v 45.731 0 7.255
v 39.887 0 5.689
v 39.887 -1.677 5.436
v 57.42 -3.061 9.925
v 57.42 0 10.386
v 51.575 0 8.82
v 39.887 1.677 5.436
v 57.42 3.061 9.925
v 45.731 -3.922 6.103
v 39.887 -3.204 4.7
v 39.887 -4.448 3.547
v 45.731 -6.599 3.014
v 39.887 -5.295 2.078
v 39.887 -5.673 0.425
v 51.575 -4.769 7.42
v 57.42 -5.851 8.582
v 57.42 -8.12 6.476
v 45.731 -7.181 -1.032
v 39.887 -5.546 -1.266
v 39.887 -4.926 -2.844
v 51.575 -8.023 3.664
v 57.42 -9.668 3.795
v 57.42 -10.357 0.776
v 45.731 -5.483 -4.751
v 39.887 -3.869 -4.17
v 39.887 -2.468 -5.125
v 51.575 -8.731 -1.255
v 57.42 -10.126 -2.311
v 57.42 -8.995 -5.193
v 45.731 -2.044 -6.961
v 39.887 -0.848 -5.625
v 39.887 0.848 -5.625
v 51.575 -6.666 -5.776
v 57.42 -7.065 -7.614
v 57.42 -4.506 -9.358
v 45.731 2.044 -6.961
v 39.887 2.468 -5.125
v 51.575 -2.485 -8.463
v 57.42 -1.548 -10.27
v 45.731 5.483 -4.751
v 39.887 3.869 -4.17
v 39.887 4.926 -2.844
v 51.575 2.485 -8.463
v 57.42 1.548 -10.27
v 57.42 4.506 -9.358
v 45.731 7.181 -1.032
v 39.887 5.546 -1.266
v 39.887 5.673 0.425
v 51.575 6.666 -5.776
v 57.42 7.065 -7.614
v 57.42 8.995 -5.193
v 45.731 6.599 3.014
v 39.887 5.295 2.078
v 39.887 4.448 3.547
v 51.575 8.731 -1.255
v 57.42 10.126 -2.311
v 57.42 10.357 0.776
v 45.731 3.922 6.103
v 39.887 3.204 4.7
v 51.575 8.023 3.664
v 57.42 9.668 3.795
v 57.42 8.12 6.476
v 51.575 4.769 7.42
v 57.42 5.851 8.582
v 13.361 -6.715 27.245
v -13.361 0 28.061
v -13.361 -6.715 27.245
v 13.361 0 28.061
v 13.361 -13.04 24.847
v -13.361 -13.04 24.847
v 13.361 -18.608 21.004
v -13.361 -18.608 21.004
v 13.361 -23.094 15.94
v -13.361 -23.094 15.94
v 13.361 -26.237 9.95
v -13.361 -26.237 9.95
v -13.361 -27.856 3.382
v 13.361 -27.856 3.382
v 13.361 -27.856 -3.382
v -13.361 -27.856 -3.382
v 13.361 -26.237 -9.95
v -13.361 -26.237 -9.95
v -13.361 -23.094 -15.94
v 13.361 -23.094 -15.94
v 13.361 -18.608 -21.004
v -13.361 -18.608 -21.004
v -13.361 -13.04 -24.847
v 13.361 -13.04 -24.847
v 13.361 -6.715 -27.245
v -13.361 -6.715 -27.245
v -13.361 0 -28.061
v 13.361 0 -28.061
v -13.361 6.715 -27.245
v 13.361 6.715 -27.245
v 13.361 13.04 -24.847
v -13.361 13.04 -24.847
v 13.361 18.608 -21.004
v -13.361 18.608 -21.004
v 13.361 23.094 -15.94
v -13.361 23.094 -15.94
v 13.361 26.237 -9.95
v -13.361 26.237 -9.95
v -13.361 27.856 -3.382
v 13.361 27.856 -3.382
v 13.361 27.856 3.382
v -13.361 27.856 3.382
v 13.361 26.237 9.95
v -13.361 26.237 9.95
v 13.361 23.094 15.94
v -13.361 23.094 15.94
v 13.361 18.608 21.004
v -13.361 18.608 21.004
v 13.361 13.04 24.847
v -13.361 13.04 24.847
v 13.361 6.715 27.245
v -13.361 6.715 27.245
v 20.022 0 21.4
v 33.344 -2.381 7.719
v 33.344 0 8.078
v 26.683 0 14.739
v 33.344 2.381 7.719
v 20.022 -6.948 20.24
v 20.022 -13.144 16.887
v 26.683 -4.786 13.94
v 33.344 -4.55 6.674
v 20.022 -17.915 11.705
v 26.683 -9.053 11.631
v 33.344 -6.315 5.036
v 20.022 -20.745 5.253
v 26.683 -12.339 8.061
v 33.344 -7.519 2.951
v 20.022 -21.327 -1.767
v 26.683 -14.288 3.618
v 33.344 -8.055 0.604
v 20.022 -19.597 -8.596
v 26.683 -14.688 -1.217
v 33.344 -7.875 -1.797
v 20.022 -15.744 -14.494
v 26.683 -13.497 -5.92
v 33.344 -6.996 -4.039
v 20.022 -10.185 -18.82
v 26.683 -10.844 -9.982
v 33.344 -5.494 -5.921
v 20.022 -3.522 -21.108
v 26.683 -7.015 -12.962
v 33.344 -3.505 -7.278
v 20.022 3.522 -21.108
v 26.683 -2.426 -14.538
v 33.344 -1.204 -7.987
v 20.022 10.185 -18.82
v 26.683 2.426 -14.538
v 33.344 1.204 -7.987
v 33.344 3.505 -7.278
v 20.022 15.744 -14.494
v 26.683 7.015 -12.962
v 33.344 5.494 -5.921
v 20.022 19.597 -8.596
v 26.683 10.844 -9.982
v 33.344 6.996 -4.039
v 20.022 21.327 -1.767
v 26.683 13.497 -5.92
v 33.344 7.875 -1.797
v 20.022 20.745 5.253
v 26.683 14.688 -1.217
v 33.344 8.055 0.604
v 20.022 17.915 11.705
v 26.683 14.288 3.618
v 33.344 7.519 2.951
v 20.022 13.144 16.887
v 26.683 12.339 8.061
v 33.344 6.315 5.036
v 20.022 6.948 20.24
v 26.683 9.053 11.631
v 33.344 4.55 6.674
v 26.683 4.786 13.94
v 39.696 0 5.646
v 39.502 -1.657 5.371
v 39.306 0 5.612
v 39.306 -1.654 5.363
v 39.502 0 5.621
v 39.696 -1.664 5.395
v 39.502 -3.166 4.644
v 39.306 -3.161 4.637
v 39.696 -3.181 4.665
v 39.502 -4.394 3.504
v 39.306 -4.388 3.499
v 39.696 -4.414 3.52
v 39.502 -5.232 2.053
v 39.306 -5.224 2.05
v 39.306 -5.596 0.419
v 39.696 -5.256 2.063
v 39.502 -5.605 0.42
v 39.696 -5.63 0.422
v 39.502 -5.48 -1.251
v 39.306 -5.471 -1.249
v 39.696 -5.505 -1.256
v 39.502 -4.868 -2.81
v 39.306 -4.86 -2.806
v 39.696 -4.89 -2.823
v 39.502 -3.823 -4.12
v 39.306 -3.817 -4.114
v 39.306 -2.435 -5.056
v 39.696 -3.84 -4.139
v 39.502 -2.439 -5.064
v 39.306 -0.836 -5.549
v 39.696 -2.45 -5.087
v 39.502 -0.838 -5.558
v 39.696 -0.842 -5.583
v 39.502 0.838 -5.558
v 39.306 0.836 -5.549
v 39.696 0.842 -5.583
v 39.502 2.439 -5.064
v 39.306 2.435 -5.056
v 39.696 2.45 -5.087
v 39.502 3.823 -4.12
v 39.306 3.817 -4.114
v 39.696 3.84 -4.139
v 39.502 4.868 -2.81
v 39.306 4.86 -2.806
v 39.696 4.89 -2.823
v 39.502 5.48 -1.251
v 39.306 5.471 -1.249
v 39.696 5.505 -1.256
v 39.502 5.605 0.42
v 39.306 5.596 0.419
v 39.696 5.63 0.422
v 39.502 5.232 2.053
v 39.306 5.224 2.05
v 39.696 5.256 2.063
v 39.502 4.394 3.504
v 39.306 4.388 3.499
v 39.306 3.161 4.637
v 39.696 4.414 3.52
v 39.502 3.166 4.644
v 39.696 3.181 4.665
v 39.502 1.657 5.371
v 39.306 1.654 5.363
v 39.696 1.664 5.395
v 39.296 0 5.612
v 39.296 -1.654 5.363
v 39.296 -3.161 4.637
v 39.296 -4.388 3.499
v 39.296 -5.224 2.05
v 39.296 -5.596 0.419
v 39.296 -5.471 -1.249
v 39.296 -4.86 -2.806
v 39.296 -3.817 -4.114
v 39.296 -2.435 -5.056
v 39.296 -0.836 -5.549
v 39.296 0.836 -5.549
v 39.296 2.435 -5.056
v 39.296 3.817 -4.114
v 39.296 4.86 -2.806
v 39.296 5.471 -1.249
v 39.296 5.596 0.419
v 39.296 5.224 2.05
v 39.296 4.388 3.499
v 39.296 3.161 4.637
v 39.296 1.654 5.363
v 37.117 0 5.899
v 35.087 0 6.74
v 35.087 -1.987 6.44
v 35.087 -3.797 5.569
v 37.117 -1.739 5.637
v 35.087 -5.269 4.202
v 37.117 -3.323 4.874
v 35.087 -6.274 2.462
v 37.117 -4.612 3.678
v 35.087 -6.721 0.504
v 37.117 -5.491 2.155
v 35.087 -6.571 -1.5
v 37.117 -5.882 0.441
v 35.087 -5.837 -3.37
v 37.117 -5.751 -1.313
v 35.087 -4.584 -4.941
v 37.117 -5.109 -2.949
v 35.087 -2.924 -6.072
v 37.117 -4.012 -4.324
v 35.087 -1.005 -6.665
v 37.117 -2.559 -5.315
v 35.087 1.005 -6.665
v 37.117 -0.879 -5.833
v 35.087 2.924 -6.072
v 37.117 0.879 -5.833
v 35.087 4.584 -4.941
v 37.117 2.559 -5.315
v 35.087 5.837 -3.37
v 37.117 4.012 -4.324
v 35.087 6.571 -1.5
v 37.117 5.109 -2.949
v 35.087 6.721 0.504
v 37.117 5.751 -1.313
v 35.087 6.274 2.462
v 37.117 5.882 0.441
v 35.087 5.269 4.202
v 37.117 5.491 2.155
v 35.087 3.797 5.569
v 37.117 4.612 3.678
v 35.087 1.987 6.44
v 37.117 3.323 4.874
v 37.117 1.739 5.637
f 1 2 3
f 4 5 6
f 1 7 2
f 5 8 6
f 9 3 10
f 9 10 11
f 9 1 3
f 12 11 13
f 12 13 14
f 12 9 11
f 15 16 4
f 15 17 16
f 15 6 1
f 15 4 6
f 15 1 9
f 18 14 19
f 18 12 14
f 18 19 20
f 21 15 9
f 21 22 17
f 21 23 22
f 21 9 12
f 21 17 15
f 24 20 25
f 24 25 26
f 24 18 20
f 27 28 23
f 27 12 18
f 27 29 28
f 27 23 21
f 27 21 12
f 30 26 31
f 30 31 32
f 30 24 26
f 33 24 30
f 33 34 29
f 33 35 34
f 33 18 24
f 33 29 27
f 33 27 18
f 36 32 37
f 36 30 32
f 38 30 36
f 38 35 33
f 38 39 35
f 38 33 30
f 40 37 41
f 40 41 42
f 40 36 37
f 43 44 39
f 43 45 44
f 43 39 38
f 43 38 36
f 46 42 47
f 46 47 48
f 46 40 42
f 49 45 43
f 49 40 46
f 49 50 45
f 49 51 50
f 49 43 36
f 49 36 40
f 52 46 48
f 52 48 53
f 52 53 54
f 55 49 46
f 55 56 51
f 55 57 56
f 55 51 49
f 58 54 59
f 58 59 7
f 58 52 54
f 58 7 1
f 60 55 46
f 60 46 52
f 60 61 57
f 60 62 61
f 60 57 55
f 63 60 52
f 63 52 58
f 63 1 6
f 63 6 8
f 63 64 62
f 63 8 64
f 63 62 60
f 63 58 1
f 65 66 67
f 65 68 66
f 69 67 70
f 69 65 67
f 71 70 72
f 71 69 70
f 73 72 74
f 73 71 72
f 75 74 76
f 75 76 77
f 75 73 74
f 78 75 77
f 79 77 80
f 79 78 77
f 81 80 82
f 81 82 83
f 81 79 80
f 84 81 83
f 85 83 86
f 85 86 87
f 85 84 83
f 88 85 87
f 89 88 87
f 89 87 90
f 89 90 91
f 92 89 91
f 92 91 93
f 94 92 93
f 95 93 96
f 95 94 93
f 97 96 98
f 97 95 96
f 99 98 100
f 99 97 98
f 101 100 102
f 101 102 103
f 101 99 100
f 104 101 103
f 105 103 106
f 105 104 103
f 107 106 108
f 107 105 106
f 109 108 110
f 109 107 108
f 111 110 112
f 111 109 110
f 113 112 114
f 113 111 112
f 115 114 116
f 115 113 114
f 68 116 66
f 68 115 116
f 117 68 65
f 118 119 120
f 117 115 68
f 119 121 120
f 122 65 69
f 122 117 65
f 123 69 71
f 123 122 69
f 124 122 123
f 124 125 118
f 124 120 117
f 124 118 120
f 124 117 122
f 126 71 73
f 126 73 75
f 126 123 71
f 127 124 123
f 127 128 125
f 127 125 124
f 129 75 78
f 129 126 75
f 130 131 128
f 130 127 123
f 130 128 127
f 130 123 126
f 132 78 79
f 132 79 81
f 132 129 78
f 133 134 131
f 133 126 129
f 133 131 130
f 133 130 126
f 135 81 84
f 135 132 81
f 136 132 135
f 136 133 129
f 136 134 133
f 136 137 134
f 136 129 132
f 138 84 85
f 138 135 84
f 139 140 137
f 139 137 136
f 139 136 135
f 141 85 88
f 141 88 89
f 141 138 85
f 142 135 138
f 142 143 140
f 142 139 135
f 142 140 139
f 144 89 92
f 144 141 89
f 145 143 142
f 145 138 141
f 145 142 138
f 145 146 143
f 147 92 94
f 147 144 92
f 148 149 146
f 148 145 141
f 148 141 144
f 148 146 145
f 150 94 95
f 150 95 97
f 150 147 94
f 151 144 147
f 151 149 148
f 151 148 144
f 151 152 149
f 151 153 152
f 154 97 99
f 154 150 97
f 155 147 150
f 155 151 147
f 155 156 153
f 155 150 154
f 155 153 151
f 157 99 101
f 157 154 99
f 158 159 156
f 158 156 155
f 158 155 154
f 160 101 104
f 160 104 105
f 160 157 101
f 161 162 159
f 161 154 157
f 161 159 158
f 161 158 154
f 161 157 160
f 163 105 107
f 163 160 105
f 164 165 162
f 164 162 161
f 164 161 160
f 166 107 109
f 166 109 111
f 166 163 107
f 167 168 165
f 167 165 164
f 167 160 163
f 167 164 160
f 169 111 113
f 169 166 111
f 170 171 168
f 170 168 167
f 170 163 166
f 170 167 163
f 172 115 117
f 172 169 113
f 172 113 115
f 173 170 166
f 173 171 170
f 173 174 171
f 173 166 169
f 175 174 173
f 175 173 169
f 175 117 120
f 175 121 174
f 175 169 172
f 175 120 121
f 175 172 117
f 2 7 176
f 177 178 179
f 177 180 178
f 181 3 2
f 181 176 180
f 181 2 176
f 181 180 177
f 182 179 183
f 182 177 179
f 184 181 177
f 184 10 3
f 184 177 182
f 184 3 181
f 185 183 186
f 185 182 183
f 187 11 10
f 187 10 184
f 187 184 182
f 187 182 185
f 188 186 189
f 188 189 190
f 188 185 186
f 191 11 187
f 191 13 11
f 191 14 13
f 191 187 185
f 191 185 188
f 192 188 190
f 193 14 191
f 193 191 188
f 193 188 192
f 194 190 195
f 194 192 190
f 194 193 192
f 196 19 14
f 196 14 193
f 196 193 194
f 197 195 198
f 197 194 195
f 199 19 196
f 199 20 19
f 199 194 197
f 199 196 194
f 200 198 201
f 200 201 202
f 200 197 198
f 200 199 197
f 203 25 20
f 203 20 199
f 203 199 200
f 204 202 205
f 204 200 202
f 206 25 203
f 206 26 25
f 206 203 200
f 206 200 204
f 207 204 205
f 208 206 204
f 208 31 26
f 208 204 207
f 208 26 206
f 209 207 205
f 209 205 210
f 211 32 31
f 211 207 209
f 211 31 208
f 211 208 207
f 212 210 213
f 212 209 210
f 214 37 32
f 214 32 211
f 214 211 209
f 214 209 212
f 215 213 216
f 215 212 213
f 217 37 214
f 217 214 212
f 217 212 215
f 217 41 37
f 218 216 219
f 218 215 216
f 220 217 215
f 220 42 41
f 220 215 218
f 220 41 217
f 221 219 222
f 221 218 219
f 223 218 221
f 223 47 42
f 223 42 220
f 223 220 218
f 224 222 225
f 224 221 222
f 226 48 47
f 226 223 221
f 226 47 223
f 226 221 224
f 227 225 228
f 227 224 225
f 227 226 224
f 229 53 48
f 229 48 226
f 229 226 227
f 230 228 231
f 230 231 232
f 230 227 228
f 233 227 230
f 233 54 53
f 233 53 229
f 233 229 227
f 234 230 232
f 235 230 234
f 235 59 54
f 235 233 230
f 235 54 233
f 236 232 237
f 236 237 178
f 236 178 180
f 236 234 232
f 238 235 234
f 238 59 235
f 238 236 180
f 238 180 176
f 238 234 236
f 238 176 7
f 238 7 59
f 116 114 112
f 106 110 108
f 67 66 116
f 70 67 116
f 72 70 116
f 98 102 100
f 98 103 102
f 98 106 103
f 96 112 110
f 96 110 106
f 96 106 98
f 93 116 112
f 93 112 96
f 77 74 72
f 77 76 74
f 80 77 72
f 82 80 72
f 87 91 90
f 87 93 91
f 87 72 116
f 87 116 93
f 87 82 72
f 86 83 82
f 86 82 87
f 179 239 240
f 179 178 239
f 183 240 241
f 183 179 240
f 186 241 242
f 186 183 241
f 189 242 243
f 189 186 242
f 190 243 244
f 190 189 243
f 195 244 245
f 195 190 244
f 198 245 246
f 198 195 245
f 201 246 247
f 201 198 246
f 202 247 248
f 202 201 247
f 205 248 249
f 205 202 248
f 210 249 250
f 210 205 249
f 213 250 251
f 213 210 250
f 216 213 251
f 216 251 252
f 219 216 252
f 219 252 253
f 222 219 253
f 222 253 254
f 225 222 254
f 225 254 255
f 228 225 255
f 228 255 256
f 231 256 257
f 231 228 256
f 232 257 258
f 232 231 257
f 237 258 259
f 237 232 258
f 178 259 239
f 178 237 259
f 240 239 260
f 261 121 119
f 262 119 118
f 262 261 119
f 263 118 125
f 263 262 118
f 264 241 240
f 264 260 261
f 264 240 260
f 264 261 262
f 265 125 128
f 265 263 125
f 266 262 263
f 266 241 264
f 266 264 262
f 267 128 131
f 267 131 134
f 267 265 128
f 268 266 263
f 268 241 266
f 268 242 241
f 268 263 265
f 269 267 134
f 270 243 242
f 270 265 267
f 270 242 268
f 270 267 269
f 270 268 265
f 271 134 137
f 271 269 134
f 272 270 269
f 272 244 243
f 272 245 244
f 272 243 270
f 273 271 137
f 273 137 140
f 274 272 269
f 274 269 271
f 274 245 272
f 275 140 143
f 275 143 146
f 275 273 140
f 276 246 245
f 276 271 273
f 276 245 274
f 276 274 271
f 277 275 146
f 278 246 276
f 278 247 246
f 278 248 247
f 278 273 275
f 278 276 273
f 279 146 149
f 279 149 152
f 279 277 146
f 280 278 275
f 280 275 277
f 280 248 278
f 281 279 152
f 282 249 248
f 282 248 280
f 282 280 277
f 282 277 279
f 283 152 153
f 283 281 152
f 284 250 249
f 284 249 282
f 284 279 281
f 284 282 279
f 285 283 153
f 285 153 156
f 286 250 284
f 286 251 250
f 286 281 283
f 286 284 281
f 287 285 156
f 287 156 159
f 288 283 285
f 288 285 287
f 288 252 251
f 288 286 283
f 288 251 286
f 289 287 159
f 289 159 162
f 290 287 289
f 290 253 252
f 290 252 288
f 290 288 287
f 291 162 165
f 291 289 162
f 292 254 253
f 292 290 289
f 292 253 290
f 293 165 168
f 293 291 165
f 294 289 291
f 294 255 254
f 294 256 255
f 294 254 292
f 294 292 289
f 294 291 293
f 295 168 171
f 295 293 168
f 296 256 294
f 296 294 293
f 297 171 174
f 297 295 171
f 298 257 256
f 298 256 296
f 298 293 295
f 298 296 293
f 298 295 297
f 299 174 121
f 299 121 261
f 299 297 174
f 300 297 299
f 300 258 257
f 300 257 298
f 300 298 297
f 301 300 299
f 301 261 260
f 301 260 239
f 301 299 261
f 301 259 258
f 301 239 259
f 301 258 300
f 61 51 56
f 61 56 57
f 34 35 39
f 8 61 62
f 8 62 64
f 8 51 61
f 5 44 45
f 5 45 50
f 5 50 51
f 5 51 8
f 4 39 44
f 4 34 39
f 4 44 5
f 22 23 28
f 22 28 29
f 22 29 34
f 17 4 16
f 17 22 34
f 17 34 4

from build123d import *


with BuildPart() as part:
    # Sketch1 → Revolve1 (revolve)
    with BuildSketch(Plane.XY, mode=Mode.PRIVATE) as revolve1_sk:
        with BuildLine():
            Line((-13.36065, 28.0607), (13.36065, 28.0607))
            Line((13.36065, 28.0607), (33.34363095, 8.07771905))
            ThreePointArc((33.34363095, 8.07771905), (36.074675364, 6.252893513), (39.2961619, 5.6121))
            Line((39.2961619, 5.6121), (39.3061619, 5.6121))
            ThreePointArc((39.3061619, 5.6121), (39.599172317, 5.631304917), (39.887169245, 5.688591068))
            Line((39.887169245, 5.688591068), (57.419630863, 10.3864))
            Line((57.419630863, 10.3864), (57.419630863, 0))
            Line((57.419630863, 0), (-13.36065, 0))
            Line((-13.36065, 0), (-13.36065, 28.0607))
        make_face()
    revolve(revolve1_sk.sketch.rotate(Axis((0, 0, 0), (1, 0, 0)), 90), axis=Axis((0, 0, 0), (1, 0, 0)))


solid = part.part
